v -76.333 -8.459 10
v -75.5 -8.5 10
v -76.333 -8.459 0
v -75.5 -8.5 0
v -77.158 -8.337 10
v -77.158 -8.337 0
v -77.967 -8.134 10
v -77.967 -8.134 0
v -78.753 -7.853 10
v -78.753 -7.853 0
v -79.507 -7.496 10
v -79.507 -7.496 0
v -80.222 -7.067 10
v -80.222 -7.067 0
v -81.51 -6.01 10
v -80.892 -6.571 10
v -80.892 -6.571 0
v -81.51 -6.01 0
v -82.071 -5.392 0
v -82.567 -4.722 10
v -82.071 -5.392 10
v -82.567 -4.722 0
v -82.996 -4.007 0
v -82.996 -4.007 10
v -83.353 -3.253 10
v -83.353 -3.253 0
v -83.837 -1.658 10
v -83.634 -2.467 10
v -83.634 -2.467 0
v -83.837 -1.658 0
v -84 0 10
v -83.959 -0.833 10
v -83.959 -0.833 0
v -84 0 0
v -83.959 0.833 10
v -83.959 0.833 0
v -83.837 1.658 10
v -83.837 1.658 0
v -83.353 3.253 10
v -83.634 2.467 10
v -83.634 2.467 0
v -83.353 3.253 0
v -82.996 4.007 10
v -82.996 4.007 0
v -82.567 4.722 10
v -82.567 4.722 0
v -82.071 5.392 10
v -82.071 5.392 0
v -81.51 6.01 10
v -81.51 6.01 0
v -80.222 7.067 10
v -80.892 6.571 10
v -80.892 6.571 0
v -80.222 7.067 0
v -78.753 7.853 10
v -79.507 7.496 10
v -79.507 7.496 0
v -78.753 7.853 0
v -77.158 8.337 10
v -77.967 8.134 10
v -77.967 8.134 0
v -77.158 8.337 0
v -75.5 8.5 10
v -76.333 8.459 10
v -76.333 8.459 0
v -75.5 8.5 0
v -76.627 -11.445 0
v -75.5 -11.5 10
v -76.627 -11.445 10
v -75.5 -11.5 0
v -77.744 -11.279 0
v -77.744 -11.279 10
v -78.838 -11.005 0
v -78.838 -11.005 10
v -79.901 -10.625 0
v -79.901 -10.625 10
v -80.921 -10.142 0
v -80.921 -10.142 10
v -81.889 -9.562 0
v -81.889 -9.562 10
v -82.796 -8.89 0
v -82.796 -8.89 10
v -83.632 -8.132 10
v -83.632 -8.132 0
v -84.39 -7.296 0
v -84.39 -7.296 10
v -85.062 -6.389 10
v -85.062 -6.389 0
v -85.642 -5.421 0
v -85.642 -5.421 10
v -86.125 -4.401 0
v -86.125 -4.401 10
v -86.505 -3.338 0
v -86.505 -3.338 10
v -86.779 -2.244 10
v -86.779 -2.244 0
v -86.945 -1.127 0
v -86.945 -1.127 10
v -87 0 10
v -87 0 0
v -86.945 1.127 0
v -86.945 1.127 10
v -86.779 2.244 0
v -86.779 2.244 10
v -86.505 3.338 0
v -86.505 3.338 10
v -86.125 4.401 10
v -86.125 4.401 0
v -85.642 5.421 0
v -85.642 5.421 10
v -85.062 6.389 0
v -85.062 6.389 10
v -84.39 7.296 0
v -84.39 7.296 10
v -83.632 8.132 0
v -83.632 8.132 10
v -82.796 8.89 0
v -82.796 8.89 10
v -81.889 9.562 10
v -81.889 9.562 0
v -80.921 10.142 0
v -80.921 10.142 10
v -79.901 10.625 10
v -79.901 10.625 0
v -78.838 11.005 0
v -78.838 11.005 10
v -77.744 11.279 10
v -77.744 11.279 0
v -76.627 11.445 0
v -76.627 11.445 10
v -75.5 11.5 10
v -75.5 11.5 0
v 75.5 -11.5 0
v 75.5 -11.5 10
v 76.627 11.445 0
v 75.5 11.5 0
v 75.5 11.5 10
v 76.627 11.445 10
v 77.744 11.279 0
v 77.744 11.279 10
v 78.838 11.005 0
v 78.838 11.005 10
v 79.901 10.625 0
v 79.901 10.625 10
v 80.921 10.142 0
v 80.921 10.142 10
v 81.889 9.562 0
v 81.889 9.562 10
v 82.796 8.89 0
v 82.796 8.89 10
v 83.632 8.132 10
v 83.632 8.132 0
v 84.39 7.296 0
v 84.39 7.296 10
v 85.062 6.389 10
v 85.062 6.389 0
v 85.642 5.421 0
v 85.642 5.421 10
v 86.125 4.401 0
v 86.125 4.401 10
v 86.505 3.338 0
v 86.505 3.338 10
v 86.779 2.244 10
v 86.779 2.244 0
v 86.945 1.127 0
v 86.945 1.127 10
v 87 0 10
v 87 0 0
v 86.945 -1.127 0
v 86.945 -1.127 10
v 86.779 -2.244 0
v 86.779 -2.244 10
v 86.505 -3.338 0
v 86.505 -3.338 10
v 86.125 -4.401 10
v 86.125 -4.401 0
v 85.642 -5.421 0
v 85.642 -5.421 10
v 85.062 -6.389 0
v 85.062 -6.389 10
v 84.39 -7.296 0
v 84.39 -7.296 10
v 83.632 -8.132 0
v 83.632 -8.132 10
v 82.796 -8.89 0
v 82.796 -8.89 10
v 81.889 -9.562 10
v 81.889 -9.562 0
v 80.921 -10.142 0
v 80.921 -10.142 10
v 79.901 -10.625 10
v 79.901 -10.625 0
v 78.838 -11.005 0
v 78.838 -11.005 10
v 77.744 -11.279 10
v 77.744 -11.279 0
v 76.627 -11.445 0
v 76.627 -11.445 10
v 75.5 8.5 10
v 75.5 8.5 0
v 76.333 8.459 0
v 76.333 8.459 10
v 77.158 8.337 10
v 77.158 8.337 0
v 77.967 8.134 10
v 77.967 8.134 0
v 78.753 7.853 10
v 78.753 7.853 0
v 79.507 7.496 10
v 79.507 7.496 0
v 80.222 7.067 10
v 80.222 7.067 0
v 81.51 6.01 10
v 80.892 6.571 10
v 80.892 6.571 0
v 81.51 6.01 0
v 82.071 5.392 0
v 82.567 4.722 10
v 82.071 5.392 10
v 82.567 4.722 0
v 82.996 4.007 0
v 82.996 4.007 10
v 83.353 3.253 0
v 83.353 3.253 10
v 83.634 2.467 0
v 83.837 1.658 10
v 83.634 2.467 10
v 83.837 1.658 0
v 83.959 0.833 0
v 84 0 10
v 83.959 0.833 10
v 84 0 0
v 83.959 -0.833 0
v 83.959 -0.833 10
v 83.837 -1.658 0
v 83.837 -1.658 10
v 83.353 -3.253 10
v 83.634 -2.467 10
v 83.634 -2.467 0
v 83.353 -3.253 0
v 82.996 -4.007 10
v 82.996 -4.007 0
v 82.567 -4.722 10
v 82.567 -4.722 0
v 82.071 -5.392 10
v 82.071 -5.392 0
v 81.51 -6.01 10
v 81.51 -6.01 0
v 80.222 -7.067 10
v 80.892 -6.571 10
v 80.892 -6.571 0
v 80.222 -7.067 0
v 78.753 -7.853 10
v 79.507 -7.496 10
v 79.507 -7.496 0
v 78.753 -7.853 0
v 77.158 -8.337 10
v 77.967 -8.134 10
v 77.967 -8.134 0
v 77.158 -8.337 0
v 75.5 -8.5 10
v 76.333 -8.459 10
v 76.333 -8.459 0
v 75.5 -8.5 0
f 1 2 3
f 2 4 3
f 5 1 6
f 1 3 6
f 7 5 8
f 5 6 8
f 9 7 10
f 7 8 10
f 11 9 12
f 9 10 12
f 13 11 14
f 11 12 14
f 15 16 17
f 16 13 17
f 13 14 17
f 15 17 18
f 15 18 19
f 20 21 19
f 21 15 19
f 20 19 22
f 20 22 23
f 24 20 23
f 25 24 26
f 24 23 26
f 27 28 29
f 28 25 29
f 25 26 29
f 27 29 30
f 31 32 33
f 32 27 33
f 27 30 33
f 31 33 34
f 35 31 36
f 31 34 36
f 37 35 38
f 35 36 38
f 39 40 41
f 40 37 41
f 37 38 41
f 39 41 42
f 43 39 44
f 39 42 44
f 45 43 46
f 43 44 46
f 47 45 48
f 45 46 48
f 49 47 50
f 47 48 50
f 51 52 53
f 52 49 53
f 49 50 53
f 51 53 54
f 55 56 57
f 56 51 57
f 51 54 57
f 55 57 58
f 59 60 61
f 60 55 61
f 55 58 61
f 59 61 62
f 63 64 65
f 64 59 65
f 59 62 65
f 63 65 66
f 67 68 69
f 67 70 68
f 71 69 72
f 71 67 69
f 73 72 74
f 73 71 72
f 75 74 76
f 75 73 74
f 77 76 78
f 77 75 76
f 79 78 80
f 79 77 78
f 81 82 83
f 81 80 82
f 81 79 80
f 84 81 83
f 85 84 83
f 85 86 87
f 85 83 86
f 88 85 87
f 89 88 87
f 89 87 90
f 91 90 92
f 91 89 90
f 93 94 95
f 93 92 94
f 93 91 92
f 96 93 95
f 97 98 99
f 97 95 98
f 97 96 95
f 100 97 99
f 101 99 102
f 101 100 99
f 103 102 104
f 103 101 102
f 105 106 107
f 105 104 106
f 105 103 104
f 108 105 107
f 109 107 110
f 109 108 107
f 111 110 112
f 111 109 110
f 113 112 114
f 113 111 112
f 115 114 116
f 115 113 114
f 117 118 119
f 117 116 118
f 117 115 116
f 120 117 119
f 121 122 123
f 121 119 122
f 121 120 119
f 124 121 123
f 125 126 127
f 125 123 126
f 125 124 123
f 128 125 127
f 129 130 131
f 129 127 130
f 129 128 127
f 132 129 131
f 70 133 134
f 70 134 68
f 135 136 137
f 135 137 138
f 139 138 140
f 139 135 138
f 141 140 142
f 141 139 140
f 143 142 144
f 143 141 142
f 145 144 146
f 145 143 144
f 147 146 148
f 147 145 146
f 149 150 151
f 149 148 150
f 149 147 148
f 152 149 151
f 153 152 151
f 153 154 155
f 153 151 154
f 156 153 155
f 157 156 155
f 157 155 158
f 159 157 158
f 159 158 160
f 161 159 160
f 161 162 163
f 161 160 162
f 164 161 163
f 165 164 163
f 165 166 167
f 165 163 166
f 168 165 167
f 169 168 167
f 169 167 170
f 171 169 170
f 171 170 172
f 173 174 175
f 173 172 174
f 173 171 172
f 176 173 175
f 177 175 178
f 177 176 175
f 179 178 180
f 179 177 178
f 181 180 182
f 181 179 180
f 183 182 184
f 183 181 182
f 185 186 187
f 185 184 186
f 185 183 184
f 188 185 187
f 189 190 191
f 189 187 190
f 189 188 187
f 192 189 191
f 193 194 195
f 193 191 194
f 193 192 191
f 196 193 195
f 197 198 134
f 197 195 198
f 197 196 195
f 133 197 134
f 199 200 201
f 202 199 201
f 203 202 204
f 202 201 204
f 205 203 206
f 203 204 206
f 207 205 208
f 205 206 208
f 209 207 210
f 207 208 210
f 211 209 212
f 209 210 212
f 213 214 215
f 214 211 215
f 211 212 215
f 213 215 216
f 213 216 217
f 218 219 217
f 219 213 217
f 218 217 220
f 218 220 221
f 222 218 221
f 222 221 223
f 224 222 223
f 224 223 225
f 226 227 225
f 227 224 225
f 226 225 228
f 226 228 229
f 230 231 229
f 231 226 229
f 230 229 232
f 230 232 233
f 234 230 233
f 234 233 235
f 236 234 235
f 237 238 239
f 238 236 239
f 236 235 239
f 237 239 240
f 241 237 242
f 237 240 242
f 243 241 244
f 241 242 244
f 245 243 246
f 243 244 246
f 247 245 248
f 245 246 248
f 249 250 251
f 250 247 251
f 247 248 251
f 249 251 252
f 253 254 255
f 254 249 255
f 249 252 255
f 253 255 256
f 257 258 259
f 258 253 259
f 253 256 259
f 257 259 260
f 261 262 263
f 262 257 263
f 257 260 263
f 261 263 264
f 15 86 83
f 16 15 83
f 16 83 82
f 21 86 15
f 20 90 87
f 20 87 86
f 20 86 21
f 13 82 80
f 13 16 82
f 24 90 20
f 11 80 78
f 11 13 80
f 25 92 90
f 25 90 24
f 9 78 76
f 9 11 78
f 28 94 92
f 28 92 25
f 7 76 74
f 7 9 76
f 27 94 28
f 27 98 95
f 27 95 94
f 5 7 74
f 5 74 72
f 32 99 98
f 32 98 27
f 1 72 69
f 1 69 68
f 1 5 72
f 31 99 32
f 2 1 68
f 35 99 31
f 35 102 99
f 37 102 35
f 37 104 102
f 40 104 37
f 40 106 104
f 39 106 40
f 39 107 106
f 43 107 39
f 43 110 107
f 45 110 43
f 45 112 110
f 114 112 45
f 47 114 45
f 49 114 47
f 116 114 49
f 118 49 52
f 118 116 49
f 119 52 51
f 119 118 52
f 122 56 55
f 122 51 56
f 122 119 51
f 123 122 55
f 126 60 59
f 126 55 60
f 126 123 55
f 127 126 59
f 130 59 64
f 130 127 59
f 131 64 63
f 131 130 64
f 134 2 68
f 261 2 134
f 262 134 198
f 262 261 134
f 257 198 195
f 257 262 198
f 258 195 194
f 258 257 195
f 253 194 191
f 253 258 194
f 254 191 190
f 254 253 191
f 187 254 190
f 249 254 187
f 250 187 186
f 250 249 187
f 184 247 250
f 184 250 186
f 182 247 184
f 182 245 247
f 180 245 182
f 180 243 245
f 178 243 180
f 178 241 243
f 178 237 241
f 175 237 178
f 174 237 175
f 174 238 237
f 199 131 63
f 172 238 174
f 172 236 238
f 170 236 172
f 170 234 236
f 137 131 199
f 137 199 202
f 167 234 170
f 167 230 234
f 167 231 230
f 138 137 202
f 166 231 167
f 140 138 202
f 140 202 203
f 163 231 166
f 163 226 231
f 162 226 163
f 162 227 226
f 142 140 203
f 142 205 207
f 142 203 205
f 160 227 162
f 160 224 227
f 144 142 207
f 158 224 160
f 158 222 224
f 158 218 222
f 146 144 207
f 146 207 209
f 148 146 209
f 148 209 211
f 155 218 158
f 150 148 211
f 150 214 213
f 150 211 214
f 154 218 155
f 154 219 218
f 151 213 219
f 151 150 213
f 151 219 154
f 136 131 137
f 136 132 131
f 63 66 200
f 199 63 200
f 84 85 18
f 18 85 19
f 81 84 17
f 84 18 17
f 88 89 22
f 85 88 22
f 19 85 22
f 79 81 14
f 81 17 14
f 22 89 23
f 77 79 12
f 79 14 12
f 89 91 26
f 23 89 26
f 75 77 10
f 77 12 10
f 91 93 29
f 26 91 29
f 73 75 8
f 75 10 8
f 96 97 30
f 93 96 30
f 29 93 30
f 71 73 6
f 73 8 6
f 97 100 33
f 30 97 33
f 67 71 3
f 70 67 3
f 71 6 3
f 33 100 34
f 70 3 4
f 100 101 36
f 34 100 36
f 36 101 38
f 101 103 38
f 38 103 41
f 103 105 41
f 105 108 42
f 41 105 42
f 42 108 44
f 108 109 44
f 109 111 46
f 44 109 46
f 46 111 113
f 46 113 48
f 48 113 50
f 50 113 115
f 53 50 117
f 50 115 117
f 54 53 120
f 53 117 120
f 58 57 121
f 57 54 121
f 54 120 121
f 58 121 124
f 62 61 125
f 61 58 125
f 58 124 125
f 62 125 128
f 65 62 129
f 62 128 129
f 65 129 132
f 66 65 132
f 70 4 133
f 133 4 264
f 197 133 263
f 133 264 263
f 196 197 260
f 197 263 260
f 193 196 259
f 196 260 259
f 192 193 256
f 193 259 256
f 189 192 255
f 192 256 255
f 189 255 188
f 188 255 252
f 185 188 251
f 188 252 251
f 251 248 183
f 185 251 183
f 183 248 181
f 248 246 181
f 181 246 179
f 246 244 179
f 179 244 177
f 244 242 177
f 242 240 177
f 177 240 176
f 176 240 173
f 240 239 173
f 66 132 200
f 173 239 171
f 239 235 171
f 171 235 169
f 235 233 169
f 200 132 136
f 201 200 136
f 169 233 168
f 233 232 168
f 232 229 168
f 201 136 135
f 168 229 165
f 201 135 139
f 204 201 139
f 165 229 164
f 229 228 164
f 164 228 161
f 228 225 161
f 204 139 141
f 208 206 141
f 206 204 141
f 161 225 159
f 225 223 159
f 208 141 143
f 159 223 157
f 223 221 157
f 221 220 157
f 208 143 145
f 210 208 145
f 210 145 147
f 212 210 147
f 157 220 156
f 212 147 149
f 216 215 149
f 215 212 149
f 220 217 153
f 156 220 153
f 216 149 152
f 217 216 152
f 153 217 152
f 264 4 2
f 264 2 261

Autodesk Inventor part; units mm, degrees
ref_plane "YZ Plane" through (0, 0, 0) normal (1, 0, 0) x (0, 1, 0)
ref_plane "XZ Plane" through (0, 0, 0) normal (0, 1, 0) x (-1, 0, 0)
ref_plane "XY Plane" through (0, 0, 0) normal (0, 0, 1) x (1, 0, 0)
sketch "Sketch1" plane through (0, 0, 0) normal (0, 0, 1) x (1, 0, 0)
  line L0 (-75.5, 11.5) -> (75.5, 11.5)
  line L1 (75.5, -11.5) -> (-75.5, -11.5)
  arc A0 (-75.5, 11.5) -> (-75.5, -11.5) centre (-75.5, 0) ccw
  arc A1 (75.5, -11.5) -> (75.5, 11.5) centre (75.5, 0) ccw
  line L2 (-75.5, 8.5) -> (75.5, 8.5)
  line L3 (-75.5, -8.5) -> (75.5, -8.5)
  arc A2 (-75.5, 8.5) -> (-75.5, -8.5) centre (-75.5, 0) ccw
  arc A3 (75.5, -8.5) -> (75.5, 8.5) centre (75.5, 0) ccw
  point P0 (0, 0)
  point P1 (0, 8.5)
  point P2 (0, 11.5)
  dimension "d0" = 151
  dimension "d1" = 23
  dimension "d2" = 3
  dimension "d3" = 3
  dimension "d4" = 11.5
  dimension "d5" = 8.5
  dimension "d7" = 8.5
  dimension "d8" = 151
  dimension "d9" = 151
extrude "Extrusion1" add sketch "Sketch1" along normal blind 10
properties part number "faja" material "Rubber, Silicone"
